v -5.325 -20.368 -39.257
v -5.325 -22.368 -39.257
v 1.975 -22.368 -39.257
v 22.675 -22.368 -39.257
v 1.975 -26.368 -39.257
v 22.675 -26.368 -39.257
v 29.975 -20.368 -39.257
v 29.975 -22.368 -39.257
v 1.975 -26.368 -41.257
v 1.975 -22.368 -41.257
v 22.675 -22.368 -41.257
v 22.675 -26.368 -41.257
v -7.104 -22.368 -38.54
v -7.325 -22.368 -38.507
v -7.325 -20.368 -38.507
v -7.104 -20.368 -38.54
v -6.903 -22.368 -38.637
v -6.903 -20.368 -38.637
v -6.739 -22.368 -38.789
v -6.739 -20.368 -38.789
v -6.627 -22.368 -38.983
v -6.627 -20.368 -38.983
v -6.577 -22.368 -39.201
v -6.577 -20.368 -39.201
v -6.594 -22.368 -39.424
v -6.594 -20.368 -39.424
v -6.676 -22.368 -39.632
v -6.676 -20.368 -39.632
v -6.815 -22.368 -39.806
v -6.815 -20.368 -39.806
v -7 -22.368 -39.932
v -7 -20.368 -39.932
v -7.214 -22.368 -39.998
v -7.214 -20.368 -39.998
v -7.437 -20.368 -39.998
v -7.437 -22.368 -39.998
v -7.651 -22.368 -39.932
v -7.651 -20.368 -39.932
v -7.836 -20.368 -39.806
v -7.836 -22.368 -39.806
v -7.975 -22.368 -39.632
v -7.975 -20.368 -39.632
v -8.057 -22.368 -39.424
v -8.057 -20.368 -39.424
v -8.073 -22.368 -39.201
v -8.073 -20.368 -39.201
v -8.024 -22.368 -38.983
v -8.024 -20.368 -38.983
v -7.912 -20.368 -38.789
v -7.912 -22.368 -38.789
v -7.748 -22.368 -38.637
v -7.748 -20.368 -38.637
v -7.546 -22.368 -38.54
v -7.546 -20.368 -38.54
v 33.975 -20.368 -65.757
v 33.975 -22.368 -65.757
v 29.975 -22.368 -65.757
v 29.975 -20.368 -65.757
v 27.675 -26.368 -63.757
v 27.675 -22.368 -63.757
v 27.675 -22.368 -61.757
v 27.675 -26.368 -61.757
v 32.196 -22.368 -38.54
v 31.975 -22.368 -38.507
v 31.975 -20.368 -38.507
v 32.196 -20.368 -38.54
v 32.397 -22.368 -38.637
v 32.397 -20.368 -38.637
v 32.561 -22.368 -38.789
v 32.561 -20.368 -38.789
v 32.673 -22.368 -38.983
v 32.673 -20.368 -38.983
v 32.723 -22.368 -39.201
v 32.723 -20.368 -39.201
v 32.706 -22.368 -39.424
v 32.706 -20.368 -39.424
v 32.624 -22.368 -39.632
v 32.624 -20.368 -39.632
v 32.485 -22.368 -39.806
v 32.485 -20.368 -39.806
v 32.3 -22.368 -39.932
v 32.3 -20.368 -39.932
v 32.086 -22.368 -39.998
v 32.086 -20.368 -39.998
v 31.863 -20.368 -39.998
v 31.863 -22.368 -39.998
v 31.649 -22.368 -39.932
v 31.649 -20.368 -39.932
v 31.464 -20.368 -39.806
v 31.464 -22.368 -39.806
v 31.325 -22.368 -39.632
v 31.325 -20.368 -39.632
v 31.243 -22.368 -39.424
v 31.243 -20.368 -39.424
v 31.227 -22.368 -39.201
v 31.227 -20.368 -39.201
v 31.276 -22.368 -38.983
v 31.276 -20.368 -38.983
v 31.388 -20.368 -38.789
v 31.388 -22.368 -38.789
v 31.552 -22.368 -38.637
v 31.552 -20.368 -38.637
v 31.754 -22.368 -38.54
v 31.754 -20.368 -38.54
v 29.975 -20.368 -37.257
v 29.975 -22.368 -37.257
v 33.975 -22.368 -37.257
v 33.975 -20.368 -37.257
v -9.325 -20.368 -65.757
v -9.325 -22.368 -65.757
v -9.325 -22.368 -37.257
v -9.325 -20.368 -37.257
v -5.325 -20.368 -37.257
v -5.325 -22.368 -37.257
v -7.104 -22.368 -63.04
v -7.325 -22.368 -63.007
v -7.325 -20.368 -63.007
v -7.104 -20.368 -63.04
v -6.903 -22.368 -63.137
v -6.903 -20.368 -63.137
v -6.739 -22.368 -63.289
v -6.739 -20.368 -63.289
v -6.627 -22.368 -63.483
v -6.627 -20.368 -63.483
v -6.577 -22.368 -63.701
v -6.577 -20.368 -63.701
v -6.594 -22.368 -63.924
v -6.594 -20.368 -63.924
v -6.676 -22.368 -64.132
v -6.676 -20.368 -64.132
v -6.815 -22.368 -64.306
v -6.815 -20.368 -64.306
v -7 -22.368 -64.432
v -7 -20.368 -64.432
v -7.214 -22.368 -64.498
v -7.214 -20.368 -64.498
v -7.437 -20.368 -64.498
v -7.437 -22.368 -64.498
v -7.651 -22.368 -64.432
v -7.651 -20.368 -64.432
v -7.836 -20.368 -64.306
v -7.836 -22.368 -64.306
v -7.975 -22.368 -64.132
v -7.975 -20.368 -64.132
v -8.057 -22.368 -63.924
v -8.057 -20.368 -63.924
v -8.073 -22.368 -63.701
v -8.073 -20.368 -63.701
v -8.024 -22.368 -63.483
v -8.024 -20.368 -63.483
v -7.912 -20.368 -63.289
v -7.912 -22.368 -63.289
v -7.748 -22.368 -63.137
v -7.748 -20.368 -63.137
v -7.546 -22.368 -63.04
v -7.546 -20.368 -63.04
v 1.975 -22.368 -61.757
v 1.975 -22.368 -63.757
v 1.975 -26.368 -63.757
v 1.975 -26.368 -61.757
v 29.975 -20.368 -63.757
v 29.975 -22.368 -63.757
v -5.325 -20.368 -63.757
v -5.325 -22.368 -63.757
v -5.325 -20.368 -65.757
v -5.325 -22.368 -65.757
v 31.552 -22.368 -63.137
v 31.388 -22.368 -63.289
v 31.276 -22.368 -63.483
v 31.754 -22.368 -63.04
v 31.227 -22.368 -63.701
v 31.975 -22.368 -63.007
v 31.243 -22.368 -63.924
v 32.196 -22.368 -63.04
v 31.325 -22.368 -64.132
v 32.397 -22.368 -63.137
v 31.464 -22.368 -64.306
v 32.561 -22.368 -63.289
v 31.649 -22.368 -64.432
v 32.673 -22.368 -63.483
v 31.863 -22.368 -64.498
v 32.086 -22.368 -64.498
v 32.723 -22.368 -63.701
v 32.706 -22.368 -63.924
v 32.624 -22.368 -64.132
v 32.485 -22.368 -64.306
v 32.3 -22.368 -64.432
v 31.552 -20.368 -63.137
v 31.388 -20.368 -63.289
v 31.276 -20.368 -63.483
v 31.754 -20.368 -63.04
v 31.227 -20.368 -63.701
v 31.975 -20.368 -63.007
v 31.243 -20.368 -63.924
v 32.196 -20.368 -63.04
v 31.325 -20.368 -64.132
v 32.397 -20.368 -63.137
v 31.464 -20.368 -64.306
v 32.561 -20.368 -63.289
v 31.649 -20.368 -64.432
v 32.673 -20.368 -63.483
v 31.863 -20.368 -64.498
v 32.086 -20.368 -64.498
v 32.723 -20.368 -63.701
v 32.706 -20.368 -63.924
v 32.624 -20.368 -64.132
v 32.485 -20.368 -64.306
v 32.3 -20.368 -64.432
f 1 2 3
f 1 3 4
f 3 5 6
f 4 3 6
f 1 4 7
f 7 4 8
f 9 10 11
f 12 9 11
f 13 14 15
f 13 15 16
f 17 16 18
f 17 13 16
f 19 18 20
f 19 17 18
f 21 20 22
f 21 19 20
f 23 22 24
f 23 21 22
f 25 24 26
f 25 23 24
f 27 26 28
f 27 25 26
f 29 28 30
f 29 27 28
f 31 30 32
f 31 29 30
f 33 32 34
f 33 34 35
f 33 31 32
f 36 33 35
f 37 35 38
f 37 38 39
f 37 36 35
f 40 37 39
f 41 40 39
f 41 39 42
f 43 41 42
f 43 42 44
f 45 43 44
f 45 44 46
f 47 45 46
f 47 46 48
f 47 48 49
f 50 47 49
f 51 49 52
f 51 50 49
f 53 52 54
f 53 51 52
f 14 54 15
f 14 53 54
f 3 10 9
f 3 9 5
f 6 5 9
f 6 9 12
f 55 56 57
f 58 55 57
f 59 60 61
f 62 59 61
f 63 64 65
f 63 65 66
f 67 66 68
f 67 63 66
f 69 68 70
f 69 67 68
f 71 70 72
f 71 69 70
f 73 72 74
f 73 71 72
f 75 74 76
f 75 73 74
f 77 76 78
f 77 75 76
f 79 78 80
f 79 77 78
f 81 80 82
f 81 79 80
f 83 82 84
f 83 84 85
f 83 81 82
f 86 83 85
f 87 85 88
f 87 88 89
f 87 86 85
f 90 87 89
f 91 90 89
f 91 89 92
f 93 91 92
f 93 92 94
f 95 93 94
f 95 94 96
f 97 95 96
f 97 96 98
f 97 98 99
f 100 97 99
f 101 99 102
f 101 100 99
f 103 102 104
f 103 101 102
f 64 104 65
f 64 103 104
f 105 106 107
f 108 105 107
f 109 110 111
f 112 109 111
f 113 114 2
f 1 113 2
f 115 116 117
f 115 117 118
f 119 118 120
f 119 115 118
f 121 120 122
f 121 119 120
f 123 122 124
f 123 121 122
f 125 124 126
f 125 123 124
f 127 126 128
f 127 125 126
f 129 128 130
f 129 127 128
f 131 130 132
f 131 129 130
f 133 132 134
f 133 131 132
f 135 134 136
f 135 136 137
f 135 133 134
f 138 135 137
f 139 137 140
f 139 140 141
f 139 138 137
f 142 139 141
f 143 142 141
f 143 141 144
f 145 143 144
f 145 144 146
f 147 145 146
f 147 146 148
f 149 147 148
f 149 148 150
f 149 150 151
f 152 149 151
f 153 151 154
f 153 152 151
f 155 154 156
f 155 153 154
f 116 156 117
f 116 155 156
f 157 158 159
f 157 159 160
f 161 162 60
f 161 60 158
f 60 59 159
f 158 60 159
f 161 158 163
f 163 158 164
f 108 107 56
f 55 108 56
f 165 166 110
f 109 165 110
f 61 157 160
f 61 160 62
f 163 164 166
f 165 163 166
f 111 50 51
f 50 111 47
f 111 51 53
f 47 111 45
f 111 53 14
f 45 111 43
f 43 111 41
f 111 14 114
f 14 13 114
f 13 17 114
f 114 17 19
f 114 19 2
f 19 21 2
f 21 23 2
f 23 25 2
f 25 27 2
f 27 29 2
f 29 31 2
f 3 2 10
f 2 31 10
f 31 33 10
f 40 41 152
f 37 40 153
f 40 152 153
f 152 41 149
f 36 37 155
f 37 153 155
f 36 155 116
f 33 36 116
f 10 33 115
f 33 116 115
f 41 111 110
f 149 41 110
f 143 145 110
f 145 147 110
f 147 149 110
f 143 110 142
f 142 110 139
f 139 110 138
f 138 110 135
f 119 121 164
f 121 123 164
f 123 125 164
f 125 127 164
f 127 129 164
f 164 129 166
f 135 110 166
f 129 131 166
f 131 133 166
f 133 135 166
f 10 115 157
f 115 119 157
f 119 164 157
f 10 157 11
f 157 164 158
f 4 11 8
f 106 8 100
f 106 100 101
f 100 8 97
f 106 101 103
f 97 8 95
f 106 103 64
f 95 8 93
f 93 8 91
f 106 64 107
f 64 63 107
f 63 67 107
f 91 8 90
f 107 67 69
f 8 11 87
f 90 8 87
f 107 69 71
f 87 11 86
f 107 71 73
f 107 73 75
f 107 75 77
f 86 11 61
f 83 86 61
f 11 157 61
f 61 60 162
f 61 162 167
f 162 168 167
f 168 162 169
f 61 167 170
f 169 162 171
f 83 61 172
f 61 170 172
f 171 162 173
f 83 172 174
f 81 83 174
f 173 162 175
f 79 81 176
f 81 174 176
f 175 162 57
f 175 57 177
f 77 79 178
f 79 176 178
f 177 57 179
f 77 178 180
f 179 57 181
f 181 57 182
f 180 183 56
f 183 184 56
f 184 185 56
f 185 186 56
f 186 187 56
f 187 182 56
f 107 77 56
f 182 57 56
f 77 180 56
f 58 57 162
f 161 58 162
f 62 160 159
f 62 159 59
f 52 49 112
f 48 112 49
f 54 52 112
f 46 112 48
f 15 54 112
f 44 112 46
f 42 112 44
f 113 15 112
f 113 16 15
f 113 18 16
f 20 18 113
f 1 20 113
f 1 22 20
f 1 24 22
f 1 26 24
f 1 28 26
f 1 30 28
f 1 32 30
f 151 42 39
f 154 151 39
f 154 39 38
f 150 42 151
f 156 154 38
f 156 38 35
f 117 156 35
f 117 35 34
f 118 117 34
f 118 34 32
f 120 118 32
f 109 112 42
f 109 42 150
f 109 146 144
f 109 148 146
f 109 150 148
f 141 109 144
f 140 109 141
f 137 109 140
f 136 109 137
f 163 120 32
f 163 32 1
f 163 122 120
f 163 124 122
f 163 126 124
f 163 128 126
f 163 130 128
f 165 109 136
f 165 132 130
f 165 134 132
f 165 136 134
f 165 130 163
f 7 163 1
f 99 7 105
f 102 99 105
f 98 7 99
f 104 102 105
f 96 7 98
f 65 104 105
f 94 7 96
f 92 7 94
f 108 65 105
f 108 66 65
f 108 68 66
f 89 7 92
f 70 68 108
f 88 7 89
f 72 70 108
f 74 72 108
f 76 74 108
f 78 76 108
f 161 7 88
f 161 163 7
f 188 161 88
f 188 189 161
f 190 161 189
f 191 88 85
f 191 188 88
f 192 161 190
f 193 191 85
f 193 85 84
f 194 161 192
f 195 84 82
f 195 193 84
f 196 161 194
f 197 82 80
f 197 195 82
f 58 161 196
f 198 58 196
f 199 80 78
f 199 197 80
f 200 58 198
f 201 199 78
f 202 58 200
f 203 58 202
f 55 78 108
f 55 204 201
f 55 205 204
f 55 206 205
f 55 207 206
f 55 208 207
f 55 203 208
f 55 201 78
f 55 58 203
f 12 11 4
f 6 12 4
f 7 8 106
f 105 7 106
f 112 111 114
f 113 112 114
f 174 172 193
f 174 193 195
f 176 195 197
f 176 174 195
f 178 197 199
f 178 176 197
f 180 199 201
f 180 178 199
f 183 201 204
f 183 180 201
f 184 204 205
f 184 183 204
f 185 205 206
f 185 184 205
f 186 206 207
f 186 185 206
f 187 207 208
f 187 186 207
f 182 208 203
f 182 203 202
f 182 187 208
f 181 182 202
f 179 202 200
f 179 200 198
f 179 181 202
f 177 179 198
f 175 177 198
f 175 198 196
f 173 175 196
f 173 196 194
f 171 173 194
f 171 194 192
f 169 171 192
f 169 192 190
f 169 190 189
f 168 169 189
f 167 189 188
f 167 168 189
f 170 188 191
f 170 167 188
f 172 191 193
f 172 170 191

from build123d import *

# Parameters (mm, degrees)
SKETCH1_R           = 0.75
BOSS_EXTRUDE1_DEPTH = 2
SKETCH2_W           = 20.7
SKETCH2_H           = 2
SKETCH2_W_2         = 25.7
BOSS_EXTRUDE2_DEPTH = 4


with BuildPart() as part:
    # Sketch1 → Boss-Extrude1 (new body)
    # profile 1 of 3: a face of its own
    with BuildSketch(Plane(origin=(0, -22.368471217, 0), x_dir=(1, 0, 0), z_dir=(0, 1, 0))):
        Polygon((-7.325383597, 61.756641018), (1.674616403, 61.756641018), (1.674616403, 63.756641018), (-5.325383597, 63.756641018), (-5.325383597, 65.756641018), (-9.325383597, 65.756641018), (-9.325383597, 37.256641018), (-5.325383597, 37.256641018), (-5.325383597, 39.256641018), (1.674616403, 39.256641018), (1.674616403, 41.256641018), (-7.325383597, 41.256641018), align=None)
        with Locations(Location((-7.325383597, 63.756641018, 0), (0, 0, 270))):
            Circle(SKETCH1_R, mode=Mode.SUBTRACT)
        with Locations(Location((-7.325383597, 39.256641018, 0), (0, 0, 270))):
            Circle(SKETCH1_R, mode=Mode.SUBTRACT)
    # profile 2 of 3: a face of its own
    with BuildSketch(Plane(origin=(0, -22.368471217, 0), x_dir=(1, 0, 0), z_dir=(0, 1, 0))):
        Polygon((1.674616403, 39.256641018), (22.974616403, 39.256641018), (22.974616403, 41.256641018), (31.974616403, 41.256641018), (31.974616403, 61.756641018), (27.974616403, 61.756641018), (27.974616403, 63.756641018), (1.674616403, 63.756641018), (1.674616403, 61.756641018), (-7.325383597, 61.756641018), (-7.325383597, 41.256641018), (1.674616403, 41.256641018), align=None)
    # profile 3 of 3: a face of its own
    with BuildSketch(Plane(origin=(0, -22.368471217, 0), x_dir=(1, 0, 0), z_dir=(0, 1, 0))):
        Polygon((29.974616403, 65.756641018), (29.974616403, 63.756641018), (27.974616403, 63.756641018), (27.974616403, 61.756641018), (31.974616403, 61.756641018), (31.974616403, 41.256641018), (22.974616403, 41.256641018), (22.974616403, 39.256641018), (29.974616403, 39.256641018), (29.974616403, 37.256641018), (33.974616403, 37.256641018), (33.974616403, 65.756641018), align=None)
        with Locations(Location((31.974616403, 39.256641018, 0), (0, 0, 270))):
            Circle(SKETCH1_R, mode=Mode.SUBTRACT)
        with Locations(Location((31.974616403, 63.756641018, 0), (0, 0, 270))):
            Circle(SKETCH1_R, mode=Mode.SUBTRACT)
    extrude(amount=BOSS_EXTRUDE1_DEPTH)

    # Sketch2 → Boss-Extrude2 (add)
    with BuildSketch(Plane.XZ.offset(22.368471217)):
        with Locations((12.324616403, -40.256641018)):
            Rectangle(SKETCH2_W, SKETCH2_H)
        with Locations((14.824616403, -62.756641018)):
            Rectangle(SKETCH2_W_2, SKETCH2_H)
    extrude(amount=BOSS_EXTRUDE2_DEPTH)


solid = part.part
